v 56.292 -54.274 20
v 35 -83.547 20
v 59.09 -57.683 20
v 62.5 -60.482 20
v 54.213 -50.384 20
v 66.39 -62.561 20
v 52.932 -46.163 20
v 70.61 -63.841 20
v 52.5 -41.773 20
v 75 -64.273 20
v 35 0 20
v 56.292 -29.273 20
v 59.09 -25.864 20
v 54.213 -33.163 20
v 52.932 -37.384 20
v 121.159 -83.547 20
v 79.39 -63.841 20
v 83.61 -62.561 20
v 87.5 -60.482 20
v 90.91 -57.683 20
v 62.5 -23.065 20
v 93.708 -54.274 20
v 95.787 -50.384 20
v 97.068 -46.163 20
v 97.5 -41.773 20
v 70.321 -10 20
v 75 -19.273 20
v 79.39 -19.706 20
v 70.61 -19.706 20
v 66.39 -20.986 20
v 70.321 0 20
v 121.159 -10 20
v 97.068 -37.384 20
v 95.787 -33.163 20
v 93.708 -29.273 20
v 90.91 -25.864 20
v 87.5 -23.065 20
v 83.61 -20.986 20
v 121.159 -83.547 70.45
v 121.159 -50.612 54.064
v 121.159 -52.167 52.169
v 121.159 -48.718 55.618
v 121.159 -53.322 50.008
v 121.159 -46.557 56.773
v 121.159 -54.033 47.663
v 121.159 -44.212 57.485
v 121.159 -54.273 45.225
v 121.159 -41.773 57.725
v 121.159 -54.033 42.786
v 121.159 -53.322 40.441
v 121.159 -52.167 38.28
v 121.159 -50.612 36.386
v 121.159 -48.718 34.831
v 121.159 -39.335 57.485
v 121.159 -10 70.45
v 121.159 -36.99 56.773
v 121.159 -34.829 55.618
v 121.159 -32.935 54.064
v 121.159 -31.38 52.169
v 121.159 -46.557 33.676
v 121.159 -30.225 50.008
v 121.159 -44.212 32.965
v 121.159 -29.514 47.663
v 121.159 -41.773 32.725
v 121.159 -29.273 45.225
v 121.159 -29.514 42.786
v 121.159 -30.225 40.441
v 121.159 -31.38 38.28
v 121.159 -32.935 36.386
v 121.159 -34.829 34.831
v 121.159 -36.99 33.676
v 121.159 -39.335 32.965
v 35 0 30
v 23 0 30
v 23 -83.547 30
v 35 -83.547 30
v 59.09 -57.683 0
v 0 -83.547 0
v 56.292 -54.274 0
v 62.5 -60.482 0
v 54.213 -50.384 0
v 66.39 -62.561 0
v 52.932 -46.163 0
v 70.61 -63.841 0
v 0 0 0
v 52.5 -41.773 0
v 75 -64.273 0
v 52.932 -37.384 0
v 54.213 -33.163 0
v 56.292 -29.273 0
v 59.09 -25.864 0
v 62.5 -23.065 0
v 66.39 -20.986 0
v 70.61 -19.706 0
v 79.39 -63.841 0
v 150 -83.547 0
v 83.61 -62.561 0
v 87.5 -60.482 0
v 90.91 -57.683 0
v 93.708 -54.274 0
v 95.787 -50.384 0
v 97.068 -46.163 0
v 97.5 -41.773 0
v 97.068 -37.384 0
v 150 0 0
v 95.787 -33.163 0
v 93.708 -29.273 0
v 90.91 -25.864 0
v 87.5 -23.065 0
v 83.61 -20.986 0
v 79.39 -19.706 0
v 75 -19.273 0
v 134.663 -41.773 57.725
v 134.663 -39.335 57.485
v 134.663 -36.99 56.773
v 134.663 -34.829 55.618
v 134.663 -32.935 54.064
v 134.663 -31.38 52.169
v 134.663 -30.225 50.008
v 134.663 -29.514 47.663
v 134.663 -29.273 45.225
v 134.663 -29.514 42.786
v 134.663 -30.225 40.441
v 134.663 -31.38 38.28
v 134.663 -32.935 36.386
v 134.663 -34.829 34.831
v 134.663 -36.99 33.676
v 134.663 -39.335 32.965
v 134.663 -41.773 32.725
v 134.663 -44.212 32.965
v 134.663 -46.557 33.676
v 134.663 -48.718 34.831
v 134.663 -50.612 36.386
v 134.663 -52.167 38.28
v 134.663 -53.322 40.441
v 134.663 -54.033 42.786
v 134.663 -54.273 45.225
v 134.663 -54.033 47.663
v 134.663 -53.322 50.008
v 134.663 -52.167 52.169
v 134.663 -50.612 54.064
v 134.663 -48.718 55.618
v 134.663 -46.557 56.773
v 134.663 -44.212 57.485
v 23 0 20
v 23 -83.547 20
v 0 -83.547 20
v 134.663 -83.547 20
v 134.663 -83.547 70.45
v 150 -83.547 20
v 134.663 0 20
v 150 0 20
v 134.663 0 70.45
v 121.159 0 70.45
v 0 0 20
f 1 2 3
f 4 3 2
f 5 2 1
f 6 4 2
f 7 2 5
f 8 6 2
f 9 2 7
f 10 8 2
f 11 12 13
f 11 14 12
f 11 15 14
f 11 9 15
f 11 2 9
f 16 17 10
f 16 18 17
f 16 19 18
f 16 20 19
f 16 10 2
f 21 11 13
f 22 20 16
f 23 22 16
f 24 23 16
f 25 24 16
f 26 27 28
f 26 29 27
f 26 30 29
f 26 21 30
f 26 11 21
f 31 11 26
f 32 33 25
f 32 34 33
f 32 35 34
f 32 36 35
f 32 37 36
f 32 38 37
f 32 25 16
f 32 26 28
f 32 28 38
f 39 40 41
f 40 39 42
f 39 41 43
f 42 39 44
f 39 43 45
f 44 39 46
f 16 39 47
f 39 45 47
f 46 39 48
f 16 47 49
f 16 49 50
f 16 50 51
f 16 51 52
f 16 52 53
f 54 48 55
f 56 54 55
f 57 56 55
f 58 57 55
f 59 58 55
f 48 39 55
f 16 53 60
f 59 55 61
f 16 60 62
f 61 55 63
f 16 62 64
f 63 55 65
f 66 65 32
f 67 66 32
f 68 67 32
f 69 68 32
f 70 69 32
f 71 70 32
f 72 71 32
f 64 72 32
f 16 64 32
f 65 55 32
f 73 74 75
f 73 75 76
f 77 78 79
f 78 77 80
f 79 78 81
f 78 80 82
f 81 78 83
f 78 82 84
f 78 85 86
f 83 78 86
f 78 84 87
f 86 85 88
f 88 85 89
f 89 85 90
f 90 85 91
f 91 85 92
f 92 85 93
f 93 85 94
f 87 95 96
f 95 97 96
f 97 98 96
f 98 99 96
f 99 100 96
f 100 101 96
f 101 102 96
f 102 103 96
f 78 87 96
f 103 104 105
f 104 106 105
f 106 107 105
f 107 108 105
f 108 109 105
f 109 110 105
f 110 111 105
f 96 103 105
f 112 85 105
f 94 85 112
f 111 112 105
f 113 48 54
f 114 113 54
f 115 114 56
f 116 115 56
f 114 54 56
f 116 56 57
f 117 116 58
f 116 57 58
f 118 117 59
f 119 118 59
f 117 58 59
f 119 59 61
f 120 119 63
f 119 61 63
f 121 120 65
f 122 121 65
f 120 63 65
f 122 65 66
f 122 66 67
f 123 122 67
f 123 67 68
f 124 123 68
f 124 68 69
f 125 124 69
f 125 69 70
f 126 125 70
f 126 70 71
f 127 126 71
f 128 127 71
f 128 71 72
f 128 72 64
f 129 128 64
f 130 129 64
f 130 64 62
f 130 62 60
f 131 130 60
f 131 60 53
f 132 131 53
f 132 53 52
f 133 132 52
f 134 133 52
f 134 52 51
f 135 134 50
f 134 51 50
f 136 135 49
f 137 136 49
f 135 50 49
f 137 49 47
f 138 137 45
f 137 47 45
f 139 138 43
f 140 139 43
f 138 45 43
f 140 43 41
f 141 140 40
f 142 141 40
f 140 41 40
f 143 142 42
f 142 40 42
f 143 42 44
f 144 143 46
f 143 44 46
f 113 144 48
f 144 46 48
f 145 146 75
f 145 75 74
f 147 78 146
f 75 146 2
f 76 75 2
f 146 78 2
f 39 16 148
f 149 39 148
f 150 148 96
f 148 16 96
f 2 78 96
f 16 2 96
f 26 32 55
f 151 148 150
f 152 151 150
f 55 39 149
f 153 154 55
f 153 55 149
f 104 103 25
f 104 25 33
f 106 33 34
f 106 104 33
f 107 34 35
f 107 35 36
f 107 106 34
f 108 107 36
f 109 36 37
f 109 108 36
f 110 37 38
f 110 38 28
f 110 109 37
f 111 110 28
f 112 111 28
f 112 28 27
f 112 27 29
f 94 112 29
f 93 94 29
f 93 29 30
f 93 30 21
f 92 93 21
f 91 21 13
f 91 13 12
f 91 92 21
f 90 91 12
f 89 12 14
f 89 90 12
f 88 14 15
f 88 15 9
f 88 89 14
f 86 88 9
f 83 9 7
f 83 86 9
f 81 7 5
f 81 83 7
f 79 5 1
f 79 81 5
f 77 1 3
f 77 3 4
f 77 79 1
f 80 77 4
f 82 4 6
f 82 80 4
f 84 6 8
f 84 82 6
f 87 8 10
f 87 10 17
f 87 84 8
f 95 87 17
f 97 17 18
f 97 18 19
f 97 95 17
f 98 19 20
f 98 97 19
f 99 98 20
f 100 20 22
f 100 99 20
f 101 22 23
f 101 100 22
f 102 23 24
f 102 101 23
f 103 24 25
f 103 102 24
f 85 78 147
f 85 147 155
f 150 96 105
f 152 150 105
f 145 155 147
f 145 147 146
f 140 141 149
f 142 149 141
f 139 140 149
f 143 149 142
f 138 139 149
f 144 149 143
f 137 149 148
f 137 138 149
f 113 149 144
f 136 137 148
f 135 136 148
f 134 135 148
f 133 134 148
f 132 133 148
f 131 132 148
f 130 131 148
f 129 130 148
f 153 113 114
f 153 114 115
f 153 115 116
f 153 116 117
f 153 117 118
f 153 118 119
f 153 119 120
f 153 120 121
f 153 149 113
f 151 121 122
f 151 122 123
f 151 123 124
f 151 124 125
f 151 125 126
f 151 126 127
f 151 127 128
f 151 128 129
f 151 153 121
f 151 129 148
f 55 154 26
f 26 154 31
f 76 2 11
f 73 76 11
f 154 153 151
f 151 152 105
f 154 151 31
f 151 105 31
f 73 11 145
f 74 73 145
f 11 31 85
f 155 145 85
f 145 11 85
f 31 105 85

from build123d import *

# Parameters (mm, degrees)
SKETCH_2_W          = 23
SKETCH_2_H          = 83.54692924
EXTRUDE_1_DEPTH     = 20
SKETCH_2_W_2        = 115
SKETCH_2_R          = 22.5
EXTRUDE_1_2_DEPTH   = 20
SKETCH_2_3_W        = 12
SKETCH_2_3_H        = 83.54692924
EXTRUDE_2_DEPTH     = 30
SKETCH_4_W          = 13.50460444
SKETCH_4_H          = 50.449539632
EXTRUDE_4_DEPTH     = 83.54692924
SKETCH_6_R          = 12.5
CUT_EXTRUDE_1_DEPTH = 164.164371188
EXTRUDE_5_DEPTH     = 10


with BuildPart() as part:
    # Эскиз2 → Бобышка-Вытянуть1 (new body)
    with BuildSketch(Plane.XY):
        with Locations((11.5, -41.77346462)):
            Rectangle(SKETCH_2_W, SKETCH_2_H)
    extrude(amount=EXTRUDE_1_DEPTH)



with BuildPart() as body_2:
    # Эскиз2 → Extrude 1 2 (new body)
    with BuildSketch(Plane.XY):
        with Locations((92.5, -41.77346462)):
            Rectangle(SKETCH_2_W_2, SKETCH_2_H)
        with Locations((75, -41.77346462)):
            Circle(SKETCH_2_R, mode=Mode.SUBTRACT)
    extrude(amount=EXTRUDE_1_2_DEPTH)


with BuildPart() as part_1:
    add(part.part)

    add(body_2.part)  # Бобышка-Вытянуть2 merges body 2
    # Эскиз2<3> → Бобышка-Вытянуть2 (add)
    with BuildSketch(Plane.XY):
        with Locations((29, -41.77346462)):
            Rectangle(SKETCH_2_3_W, SKETCH_2_3_H)
    extrude(amount=EXTRUDE_2_DEPTH)

    # Эскиз4 → Бобышка-Вытянуть4 (add)
    with BuildSketch(Plane(origin=(0, 0, 0), x_dir=(1, 0, 0), z_dir=(0, 1, 0))):
        with Locations((127.910814118, -45.224769816)):
            Rectangle(SKETCH_4_W, SKETCH_4_H)
    extrude(amount=-EXTRUDE_4_DEPTH)

    # Эскиз6 → Вырез-Вытянуть1 (cut, through all)
    with BuildSketch(Plane.ZY.offset(-121.158511898)):
        with Locations((45.224769816, -41.77346462)):
            Circle(SKETCH_6_R)
    extrude(amount=-CUT_EXTRUDE_1_DEPTH, mode=Mode.SUBTRACT)

    # Эскиз7 → Бобышка-Вытянуть5 (add)
    with BuildSketch(Plane(origin=(0, 0, 0), x_dir=(1, 0, 0), z_dir=(0, 1, 0))):
        Polygon((121.158511898, -70.449539632), (70.320934242, -20), (121.158511898, -20), align=None)
    extrude(amount=-EXTRUDE_5_DEPTH)


solid = part_1.part
